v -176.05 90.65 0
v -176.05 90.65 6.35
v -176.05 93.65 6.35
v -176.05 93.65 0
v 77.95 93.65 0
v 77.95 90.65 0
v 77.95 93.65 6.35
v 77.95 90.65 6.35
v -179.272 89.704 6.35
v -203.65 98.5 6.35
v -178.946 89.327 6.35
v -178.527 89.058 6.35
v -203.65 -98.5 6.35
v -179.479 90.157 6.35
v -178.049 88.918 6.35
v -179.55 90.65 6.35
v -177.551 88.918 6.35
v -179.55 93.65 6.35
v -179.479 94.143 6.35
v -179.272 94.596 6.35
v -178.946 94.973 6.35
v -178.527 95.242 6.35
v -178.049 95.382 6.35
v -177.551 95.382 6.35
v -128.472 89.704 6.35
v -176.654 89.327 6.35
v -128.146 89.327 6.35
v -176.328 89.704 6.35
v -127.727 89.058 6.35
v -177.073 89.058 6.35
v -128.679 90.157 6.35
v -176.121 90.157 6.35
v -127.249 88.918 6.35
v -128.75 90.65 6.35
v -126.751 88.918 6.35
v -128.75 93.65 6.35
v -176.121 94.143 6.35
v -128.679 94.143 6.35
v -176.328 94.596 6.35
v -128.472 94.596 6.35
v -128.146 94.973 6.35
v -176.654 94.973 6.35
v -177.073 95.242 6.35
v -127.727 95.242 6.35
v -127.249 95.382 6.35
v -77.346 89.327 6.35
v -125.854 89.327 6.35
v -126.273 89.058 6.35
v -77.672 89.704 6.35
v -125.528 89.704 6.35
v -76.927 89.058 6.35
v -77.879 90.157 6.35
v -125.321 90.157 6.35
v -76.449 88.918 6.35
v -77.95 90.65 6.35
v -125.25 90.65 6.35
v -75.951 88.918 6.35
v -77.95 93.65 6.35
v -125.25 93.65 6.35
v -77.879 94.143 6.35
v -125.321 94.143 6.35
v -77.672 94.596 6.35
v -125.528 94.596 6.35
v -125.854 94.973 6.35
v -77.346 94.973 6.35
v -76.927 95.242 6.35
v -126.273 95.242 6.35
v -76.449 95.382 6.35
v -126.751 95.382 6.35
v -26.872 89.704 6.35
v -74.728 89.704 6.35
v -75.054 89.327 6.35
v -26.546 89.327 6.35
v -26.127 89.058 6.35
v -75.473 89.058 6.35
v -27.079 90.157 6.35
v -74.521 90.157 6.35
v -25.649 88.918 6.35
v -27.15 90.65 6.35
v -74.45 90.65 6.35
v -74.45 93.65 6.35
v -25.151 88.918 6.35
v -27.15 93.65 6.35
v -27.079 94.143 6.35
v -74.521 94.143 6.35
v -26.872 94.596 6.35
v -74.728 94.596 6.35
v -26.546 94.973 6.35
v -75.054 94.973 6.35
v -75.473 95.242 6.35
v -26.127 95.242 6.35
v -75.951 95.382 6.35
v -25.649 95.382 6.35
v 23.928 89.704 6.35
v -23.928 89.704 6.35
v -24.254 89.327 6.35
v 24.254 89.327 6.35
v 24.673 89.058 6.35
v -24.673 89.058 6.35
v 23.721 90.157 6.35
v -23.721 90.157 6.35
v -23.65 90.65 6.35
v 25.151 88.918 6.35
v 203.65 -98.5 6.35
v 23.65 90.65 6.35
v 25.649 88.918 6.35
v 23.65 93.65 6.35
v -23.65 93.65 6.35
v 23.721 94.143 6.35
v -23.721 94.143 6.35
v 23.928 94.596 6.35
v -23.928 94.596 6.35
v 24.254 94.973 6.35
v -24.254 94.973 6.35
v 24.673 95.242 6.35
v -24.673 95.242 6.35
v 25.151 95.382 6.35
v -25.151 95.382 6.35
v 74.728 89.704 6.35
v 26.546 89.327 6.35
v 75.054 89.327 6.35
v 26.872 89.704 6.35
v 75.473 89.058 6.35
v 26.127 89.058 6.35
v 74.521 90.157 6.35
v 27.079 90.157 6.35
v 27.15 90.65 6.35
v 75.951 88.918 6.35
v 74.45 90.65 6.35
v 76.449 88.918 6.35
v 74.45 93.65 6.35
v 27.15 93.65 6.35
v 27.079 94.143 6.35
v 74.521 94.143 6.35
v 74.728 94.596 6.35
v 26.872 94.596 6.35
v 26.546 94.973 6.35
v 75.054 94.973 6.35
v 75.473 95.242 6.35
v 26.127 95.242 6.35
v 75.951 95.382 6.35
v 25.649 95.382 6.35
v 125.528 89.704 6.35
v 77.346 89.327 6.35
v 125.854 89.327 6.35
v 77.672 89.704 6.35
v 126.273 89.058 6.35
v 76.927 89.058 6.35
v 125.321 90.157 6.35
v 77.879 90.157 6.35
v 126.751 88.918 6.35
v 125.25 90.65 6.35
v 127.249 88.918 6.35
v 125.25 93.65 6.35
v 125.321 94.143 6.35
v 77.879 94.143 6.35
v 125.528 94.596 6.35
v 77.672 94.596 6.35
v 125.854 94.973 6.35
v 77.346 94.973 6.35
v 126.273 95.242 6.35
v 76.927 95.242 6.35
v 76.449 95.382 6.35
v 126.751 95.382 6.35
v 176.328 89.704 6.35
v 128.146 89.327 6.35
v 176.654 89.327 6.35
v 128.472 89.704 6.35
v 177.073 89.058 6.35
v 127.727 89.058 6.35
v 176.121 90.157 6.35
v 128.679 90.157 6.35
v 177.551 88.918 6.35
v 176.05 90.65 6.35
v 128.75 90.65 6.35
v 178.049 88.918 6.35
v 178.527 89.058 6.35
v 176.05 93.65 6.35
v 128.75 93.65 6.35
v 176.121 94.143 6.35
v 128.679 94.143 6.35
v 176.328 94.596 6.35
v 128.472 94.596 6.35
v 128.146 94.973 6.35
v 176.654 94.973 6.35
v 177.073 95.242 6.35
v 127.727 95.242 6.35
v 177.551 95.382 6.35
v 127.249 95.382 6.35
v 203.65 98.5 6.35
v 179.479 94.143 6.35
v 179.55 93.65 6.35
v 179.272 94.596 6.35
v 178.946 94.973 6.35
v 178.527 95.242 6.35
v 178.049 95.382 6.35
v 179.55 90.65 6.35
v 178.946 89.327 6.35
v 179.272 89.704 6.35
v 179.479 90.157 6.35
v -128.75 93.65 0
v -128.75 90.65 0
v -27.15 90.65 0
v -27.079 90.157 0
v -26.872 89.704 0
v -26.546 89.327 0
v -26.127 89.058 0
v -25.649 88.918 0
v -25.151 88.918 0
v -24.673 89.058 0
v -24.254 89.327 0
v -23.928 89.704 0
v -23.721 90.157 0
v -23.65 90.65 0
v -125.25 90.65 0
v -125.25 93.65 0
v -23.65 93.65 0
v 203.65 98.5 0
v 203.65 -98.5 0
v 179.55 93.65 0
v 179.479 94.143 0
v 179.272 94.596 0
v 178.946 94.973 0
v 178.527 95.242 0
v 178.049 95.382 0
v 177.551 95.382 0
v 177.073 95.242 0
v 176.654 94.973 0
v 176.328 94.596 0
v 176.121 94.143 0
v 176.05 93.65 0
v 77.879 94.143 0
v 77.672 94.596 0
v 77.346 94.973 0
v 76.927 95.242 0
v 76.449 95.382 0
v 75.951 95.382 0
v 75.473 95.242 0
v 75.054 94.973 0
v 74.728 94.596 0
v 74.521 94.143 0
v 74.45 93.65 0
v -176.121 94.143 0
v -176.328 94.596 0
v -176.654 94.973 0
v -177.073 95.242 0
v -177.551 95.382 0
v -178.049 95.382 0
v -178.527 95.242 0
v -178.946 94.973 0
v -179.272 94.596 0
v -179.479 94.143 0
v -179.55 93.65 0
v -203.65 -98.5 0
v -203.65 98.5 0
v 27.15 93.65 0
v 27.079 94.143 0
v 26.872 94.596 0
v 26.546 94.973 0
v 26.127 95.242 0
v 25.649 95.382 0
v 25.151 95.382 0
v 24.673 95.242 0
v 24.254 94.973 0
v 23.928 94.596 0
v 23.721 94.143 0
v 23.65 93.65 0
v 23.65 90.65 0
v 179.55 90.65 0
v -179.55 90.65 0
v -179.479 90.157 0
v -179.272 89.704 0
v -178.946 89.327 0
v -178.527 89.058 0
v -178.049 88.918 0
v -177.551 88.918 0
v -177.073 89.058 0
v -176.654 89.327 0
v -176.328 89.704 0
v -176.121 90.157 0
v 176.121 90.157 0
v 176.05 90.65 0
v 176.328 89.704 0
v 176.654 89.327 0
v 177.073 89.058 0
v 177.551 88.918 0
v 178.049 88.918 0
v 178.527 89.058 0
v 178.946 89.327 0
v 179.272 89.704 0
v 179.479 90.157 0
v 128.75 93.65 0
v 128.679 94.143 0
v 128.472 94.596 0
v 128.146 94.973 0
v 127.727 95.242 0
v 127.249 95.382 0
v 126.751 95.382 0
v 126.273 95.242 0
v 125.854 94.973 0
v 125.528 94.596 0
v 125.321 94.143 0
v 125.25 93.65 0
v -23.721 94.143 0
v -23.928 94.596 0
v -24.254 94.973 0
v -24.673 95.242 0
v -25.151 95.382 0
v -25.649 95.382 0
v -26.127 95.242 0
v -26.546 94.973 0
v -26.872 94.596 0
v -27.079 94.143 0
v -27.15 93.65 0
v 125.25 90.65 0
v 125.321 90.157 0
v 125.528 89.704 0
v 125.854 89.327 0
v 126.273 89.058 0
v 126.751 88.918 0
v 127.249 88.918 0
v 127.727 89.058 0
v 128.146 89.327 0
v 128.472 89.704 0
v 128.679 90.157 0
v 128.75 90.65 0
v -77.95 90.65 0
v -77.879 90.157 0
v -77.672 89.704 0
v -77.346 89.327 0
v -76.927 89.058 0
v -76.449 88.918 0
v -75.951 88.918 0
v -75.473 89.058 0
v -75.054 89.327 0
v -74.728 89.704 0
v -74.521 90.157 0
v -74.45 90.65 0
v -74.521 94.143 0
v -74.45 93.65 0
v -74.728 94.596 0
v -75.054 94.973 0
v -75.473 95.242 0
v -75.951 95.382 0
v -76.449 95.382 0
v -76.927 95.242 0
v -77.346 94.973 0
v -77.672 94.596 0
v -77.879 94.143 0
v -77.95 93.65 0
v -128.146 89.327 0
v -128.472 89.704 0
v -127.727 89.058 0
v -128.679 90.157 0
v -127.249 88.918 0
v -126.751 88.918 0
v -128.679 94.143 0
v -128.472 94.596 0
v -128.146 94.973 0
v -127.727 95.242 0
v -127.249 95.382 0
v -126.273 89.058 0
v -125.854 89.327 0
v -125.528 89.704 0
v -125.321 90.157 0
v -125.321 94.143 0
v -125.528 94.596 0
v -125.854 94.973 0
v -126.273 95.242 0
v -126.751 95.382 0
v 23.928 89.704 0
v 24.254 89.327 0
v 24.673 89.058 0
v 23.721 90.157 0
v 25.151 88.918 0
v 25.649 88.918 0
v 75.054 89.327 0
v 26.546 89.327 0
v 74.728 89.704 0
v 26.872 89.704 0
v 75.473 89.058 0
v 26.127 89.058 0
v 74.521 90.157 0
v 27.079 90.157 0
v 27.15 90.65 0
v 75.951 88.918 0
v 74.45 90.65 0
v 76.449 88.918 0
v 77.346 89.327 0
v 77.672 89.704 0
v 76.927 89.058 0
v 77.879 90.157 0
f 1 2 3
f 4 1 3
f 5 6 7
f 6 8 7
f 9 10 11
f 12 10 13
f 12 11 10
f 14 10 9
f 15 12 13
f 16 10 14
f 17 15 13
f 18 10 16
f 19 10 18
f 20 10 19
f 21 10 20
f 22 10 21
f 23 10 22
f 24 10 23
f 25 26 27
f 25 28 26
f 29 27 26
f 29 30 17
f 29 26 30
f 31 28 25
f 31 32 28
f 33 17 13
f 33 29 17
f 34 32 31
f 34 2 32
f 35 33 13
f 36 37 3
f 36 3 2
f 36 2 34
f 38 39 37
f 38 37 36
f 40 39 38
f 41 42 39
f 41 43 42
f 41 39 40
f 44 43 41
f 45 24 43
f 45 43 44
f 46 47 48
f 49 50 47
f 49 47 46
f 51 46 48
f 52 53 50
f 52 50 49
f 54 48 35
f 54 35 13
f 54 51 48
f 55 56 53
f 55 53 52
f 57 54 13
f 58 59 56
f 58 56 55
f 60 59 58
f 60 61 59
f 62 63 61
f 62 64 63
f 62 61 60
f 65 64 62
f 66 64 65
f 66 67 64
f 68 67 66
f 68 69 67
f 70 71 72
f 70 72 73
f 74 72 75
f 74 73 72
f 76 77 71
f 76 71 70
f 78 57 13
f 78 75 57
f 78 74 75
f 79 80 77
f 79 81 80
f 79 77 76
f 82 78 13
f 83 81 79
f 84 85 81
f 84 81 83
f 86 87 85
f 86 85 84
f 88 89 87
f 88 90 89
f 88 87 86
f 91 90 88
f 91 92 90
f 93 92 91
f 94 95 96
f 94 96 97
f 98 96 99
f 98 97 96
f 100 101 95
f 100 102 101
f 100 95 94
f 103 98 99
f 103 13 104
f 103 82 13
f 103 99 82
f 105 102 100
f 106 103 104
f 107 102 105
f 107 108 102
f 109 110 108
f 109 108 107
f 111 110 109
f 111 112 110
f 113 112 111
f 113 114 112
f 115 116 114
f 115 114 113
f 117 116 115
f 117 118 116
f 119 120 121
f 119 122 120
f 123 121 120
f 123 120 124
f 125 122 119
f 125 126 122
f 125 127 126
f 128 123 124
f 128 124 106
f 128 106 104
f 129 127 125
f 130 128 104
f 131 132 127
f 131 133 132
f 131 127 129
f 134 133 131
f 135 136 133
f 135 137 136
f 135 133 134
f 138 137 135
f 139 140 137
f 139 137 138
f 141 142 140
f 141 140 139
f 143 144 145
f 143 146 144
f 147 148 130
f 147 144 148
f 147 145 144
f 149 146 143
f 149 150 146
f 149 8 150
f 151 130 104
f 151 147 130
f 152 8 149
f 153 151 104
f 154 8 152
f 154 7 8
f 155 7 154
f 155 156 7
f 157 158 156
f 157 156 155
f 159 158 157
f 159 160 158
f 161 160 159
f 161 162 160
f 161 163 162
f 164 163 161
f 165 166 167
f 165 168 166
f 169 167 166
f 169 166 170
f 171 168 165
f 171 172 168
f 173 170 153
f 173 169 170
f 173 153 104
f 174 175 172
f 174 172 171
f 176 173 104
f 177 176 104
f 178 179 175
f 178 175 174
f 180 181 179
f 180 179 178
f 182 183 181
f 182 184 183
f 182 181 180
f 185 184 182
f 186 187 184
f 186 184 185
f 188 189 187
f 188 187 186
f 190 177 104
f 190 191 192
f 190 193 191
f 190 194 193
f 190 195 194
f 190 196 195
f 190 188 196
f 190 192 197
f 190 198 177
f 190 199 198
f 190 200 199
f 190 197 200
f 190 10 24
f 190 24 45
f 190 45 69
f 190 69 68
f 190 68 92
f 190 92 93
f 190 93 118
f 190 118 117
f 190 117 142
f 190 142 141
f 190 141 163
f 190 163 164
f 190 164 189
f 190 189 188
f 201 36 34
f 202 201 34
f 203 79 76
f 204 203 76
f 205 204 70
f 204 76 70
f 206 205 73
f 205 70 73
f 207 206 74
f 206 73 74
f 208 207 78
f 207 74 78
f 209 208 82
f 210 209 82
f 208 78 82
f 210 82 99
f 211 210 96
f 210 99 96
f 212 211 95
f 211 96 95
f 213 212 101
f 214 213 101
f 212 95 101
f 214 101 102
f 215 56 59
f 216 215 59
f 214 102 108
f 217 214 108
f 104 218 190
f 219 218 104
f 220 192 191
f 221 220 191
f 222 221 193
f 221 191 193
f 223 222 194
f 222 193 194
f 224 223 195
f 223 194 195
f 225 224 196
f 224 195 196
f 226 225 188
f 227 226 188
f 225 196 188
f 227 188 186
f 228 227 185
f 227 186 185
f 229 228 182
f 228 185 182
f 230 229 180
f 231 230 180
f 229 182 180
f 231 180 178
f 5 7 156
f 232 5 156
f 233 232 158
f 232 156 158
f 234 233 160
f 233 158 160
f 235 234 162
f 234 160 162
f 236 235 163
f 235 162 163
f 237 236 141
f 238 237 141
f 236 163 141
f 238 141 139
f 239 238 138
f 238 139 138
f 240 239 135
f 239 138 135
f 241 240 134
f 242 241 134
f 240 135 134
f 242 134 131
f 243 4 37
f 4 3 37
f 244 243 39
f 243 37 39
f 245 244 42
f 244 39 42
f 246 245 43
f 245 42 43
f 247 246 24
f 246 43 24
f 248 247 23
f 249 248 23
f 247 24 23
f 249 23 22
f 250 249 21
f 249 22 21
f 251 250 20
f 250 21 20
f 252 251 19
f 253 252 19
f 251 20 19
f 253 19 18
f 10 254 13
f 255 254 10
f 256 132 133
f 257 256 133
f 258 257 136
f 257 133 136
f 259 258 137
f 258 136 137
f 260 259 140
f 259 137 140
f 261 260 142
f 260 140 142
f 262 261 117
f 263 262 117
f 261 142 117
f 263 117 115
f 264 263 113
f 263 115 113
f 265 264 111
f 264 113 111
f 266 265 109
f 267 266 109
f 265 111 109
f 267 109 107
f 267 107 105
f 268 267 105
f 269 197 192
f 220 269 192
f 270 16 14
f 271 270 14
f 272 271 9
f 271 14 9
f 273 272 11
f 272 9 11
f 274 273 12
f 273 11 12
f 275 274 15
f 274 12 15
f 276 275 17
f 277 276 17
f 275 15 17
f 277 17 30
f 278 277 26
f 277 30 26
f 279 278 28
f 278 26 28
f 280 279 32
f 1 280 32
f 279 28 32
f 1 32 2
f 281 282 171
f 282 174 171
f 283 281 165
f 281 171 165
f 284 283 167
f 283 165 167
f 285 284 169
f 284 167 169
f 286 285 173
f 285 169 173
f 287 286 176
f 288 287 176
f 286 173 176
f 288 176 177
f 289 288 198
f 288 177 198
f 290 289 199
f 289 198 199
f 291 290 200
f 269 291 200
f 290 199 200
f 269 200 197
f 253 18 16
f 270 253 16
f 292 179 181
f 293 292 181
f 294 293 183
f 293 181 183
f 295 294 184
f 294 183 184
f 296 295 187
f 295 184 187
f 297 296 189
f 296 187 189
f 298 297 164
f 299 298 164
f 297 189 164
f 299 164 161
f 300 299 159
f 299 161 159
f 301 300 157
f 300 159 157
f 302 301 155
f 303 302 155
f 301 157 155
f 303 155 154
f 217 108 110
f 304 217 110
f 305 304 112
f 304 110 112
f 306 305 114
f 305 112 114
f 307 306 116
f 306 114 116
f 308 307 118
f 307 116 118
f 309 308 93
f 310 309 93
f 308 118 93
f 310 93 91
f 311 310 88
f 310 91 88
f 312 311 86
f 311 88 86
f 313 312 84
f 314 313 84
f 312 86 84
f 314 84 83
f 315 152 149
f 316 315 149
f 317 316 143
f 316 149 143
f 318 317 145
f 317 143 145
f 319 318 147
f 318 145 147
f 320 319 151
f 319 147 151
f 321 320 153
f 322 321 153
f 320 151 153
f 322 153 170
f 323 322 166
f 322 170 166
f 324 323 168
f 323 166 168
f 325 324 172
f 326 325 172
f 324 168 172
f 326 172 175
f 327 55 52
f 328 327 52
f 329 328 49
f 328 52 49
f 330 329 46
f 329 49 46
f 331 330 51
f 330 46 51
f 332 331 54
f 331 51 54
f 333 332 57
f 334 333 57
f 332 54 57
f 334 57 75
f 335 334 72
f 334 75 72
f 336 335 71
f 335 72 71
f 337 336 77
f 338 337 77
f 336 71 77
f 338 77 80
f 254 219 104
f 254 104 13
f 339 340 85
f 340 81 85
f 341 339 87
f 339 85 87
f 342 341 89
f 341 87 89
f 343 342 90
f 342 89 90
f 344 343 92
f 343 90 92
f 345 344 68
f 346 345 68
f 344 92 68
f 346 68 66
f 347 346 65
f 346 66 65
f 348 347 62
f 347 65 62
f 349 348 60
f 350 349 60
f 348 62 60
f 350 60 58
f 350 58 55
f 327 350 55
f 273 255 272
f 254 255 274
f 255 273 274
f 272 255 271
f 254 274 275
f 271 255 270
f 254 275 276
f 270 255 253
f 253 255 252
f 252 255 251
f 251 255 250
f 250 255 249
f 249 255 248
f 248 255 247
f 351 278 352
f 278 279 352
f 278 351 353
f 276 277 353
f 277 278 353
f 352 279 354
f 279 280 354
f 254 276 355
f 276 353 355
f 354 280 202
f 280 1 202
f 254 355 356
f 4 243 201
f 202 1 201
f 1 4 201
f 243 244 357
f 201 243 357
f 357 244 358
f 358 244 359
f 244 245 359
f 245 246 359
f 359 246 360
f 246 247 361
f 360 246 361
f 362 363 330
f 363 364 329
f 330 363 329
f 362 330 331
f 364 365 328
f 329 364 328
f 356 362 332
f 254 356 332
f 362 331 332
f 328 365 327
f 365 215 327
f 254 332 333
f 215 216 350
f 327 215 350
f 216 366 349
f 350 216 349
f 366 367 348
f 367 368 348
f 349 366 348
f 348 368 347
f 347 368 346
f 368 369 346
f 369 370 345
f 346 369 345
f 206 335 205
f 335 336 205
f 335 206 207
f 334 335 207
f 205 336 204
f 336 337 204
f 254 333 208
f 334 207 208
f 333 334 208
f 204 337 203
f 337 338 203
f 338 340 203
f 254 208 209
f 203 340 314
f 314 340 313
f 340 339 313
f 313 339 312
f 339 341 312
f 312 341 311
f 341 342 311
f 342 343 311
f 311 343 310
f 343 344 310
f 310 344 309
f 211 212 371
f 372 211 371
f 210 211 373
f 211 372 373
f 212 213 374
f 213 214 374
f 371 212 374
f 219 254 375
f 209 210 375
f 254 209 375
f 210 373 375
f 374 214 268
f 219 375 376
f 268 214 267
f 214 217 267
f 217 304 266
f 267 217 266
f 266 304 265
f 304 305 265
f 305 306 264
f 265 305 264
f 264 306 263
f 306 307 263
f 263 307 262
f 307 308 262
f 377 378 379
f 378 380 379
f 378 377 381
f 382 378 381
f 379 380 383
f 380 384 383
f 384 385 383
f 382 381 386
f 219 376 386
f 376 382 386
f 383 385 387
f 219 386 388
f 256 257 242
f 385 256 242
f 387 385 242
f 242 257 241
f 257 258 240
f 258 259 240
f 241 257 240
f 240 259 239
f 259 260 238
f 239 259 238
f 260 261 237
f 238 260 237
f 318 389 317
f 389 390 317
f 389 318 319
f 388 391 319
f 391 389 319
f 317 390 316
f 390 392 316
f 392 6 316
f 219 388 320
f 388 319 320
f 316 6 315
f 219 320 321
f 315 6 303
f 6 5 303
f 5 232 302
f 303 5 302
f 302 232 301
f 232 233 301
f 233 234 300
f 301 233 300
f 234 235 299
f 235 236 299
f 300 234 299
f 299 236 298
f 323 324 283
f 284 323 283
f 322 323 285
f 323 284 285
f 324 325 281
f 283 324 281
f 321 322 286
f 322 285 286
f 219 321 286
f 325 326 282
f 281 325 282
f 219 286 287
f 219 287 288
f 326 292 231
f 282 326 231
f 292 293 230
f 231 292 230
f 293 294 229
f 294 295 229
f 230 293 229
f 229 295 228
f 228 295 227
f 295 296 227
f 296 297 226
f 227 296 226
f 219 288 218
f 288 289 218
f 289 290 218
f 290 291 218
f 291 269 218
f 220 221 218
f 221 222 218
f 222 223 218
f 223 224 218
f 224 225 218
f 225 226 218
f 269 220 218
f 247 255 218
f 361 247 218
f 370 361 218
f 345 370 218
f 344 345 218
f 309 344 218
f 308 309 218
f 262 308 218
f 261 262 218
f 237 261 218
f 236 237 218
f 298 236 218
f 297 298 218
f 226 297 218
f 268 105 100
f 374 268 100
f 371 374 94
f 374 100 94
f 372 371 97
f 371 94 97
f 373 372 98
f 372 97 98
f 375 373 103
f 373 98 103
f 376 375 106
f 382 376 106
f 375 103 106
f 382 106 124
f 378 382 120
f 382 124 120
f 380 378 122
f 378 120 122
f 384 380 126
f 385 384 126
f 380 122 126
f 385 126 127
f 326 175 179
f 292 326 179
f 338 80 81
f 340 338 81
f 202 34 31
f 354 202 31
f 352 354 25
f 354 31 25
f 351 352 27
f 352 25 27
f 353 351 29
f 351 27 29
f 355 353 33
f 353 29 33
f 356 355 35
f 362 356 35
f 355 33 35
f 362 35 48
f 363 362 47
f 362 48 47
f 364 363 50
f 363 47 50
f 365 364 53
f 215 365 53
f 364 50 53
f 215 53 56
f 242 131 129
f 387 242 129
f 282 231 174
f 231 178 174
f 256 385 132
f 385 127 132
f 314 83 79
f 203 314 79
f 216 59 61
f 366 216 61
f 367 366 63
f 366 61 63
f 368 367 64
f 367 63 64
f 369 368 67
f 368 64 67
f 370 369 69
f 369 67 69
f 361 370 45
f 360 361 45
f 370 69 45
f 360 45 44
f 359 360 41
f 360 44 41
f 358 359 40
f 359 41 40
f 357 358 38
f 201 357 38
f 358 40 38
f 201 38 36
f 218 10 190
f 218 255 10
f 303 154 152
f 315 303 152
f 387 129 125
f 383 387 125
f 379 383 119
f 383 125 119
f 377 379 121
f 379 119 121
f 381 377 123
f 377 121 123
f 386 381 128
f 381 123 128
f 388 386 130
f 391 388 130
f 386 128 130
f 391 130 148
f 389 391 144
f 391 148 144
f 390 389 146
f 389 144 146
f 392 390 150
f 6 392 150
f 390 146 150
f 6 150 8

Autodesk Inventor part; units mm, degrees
ref_plane "YZ Plane" through (0, 0, 0) normal (1, 0, 0) x (0, 1, 0)
ref_plane "XZ Plane" through (0, 0, 0) normal (0, 1, 0) x (-1, 0, 0)
ref_plane "XY Plane" through (0, 0, 0) normal (0, 0, 1) x (1, 0, 0)
sketch "Sketch1" plane through (0, 0, 0) normal (0, 0, 1) x (1, 0, 0)
  line L0 (-203.65, 98.5) -> (203.65, 98.5)
  line L1 (203.65, 98.5) -> (203.65, -98.5)
  line L2 (203.65, -98.5) -> (-203.65, -98.5)
  line L3 (-203.65, -98.5) -> (-203.65, 98.5)
  point P0 (0, 0)
  dimension "d0" = 407.3
  dimension "d1" = 197
  dimension "d2" = 203.65
  dimension "d3" = 98.5
extrude "Extrusion1" add sketch "Sketch1" along normal blind 6.35
sketch "Sketch2" plane through (0, 0, 6.35) normal (0, 0, 1) x (1, 0, 0)
  line L0 (203.65, 98.5) -> (-203.65, 98.5) projected
  line L1 (-203.65, 98.5) -> (-203.65, -98.5) projected
  line L2 (-177.8, 93.65) -> (-177.8, 90.65) construction
  line L3 (-179.55, 93.65) -> (-179.55, 90.65)
  line L4 (-176.05, 90.65) -> (-176.05, 93.65)
  arc A0 (-176.05, 93.65) -> (-179.55, 93.65) centre (-177.8, 93.65) ccw
  arc A1 (-179.55, 90.65) -> (-176.05, 90.65) centre (-177.8, 90.65) ccw
  point P0 (0, 0)
  point P1 (-177.8, 92.15)
  dimension "d7" = 3
  dimension "d8" = 3.5
  dimension "d9" = 25.85
  dimension "d10" = 6.35
extrude "Extrusion2" cut sketch "Sketch2" against normal through all
pattern_linear "Rectangular Pattern1" count 8 spacing 50.8 along (1, 0, 0) of "Extrusion2"
equation "\"d2\" = 0.5 * d0"
equation "\"d3\" = 0.5 * d1"
properties part number "case_door" material "Polycarbonate, Smoke"
